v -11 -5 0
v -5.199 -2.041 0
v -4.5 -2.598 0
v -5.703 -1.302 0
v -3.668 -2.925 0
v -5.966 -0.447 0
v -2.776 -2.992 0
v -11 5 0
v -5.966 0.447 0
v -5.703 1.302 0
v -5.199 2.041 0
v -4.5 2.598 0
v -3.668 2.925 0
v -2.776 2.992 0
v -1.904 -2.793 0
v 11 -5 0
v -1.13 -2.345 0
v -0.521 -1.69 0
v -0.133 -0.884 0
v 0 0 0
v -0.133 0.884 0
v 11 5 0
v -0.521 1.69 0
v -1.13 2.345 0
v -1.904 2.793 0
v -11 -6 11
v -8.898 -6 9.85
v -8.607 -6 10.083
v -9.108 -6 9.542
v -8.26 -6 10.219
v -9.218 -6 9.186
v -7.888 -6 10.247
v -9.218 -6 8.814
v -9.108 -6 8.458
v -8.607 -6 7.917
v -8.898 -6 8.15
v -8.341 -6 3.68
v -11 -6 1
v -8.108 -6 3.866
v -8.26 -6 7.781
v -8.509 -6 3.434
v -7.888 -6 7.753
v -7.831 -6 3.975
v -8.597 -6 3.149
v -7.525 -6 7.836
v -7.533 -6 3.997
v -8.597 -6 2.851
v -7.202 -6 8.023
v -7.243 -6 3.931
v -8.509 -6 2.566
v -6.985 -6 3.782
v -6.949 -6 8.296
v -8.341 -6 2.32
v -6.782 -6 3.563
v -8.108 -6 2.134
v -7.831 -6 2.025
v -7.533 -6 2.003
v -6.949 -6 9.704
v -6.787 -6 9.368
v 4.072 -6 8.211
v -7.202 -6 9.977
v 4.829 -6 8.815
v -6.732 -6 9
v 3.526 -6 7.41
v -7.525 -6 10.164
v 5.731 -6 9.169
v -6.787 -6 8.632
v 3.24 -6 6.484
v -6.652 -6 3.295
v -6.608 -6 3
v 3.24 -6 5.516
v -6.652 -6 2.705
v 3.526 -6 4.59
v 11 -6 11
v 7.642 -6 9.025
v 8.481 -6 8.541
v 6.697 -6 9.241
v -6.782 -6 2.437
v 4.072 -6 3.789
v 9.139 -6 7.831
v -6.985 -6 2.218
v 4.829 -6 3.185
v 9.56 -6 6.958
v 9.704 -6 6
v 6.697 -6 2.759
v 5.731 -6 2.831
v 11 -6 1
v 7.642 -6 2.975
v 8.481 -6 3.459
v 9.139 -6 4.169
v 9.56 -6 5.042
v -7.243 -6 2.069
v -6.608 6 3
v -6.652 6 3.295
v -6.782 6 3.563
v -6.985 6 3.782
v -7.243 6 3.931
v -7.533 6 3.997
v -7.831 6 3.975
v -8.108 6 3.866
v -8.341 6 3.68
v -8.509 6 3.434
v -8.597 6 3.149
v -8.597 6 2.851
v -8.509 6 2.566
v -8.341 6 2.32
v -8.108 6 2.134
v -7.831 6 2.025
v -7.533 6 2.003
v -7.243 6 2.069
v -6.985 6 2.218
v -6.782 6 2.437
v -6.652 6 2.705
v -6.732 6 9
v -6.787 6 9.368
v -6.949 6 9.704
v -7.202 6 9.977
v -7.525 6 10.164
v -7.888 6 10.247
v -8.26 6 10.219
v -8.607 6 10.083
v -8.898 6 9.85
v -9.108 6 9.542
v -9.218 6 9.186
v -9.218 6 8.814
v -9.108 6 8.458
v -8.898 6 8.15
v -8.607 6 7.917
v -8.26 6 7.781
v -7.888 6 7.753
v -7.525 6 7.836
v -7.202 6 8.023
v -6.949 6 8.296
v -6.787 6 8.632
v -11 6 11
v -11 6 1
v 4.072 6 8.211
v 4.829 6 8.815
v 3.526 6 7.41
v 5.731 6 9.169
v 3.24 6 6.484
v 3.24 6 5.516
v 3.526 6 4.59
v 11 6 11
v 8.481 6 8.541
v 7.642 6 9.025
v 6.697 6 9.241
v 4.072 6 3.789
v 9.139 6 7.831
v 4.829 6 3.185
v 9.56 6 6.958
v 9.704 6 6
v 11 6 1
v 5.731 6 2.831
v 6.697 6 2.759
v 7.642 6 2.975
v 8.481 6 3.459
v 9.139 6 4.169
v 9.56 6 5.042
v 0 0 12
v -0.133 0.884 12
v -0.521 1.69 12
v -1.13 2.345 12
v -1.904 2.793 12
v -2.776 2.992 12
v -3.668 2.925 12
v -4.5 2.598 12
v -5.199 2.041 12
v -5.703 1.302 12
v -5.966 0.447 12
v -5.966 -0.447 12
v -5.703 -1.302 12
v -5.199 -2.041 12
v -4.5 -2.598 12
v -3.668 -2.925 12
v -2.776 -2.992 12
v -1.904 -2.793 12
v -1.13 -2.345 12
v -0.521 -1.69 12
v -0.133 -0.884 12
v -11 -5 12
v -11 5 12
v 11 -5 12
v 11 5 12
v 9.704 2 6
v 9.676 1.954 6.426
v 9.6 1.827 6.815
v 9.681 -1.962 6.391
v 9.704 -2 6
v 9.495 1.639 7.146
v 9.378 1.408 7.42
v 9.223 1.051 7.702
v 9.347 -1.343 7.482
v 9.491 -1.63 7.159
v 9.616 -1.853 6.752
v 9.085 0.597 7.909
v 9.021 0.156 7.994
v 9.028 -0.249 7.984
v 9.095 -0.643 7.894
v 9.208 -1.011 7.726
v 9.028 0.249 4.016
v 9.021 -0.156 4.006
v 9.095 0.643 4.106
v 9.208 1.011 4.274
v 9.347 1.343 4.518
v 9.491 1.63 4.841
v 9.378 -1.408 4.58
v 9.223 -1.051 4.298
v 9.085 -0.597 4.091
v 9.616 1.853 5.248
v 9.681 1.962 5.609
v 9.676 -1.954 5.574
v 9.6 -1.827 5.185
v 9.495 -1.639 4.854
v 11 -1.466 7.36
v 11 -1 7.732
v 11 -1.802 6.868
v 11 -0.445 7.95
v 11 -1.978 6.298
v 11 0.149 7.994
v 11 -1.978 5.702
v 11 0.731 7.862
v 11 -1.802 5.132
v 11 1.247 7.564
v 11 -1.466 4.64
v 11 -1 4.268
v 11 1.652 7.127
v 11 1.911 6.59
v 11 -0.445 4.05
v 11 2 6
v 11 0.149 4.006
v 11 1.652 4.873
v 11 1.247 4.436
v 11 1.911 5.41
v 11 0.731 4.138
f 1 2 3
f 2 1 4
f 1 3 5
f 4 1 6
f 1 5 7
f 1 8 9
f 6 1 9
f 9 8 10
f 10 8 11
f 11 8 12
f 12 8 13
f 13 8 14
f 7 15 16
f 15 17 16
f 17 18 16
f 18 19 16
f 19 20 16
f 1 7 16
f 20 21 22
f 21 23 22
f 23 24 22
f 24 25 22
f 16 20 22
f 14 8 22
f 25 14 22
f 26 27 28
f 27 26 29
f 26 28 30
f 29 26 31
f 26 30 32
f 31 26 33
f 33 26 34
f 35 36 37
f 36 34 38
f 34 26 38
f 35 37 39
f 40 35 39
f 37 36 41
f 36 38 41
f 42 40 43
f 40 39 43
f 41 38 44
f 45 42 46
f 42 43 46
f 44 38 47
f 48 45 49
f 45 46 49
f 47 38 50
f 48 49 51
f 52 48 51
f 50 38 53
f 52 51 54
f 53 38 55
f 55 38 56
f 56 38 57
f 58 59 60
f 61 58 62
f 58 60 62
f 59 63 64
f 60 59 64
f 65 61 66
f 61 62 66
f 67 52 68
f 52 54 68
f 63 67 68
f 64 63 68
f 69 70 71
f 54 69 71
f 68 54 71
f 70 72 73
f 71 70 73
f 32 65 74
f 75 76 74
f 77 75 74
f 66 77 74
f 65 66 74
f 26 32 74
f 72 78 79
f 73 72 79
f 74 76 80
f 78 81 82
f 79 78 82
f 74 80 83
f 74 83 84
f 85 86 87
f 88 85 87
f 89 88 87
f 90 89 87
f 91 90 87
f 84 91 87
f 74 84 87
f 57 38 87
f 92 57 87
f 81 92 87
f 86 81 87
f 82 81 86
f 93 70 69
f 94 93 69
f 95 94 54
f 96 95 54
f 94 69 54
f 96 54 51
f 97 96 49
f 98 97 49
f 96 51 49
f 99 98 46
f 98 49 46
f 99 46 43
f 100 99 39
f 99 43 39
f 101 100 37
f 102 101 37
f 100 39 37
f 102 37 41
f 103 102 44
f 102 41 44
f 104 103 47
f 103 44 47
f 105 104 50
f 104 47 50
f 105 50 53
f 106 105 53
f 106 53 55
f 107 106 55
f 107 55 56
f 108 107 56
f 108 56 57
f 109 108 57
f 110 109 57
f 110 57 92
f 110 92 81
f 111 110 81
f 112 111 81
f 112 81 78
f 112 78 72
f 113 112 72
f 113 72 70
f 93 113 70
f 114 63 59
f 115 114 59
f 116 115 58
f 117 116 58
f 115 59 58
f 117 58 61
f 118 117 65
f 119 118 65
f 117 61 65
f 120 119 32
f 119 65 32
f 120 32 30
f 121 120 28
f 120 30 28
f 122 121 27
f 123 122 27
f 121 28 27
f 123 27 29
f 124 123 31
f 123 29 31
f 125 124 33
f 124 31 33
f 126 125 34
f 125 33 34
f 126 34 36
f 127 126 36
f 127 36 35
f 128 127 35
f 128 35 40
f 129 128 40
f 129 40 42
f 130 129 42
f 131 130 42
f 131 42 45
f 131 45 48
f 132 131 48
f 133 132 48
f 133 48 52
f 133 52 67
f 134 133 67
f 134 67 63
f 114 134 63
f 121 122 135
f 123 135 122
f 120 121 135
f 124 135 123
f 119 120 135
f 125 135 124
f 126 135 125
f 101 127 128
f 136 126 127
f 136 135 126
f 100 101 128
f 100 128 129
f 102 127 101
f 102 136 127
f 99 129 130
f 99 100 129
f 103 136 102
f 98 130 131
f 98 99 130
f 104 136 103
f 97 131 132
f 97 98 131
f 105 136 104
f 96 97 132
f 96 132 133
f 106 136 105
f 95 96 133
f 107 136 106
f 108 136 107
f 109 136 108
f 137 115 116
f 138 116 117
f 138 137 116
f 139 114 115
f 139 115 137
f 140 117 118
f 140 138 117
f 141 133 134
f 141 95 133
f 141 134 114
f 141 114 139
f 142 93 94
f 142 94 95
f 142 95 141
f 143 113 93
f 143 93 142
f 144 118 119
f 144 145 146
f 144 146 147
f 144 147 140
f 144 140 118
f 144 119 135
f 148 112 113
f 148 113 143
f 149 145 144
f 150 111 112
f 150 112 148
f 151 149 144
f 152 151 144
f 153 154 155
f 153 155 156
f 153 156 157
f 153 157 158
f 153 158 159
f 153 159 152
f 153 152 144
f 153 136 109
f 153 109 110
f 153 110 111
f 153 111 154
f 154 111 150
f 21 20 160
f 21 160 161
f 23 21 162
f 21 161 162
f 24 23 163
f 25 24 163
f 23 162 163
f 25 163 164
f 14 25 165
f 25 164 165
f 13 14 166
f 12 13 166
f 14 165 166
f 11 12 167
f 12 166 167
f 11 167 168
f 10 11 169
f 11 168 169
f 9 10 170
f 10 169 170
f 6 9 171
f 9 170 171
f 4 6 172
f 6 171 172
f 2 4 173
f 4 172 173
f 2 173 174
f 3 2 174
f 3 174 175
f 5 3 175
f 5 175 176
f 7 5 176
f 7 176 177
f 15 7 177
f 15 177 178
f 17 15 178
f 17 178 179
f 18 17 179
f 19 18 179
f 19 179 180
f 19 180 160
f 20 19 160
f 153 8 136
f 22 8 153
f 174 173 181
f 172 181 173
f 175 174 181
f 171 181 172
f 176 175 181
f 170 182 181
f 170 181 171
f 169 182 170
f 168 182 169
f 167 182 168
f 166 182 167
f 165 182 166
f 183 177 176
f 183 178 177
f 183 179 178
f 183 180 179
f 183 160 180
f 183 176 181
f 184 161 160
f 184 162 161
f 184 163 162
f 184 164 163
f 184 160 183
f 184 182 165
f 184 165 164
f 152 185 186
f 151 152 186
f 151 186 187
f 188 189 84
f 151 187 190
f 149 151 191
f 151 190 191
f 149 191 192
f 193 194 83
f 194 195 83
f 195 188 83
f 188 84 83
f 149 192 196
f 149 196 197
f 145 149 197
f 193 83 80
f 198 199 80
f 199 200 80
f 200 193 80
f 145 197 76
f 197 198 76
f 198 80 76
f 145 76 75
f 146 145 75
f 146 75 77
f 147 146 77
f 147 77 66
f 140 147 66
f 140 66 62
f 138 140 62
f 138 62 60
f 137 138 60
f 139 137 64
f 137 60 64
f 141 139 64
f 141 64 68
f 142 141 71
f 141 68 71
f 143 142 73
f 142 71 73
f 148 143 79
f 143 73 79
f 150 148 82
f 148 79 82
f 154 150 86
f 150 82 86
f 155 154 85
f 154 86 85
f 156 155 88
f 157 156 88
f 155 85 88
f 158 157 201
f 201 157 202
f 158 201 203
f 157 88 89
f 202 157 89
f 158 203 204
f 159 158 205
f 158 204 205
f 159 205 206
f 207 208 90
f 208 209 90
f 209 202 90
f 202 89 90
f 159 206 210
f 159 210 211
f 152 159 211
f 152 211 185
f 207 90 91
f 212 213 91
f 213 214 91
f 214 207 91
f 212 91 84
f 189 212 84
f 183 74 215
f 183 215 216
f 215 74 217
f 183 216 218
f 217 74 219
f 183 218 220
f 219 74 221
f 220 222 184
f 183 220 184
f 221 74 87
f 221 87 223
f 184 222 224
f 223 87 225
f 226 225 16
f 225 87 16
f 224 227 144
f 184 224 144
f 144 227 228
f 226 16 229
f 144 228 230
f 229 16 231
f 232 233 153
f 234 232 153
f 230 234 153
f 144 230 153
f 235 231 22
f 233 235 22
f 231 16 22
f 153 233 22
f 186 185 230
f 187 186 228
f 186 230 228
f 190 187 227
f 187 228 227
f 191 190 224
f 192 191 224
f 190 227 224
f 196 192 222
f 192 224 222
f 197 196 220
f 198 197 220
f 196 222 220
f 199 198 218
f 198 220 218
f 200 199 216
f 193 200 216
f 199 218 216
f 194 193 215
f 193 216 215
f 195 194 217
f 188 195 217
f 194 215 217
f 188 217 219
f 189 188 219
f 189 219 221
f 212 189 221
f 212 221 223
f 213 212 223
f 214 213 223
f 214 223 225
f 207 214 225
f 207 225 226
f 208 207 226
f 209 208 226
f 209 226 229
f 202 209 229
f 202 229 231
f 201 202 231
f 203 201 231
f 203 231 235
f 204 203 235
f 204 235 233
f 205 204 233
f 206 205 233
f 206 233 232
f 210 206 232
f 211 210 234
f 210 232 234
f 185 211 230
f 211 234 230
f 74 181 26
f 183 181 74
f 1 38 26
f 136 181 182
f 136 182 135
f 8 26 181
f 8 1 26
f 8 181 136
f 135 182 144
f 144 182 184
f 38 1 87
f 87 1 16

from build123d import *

# Parameters (mm, degrees)
F0_W     = 22
F0_H     = 12
F1_DEPTH = 12
F2_SIZE  = 1
F3_R     = 3.25
F3_R_2   = 1.25
F3_R_3   = 1
F4_DEPTH = 12.001
F7_R     = 2
F5_DEPTH = 4
F6_R     = 3
F8_DEPTH = 25


with BuildPart() as f1:
    # F0 (on Top) → F1 (new body)
    with BuildSketch(Plane.XY):
        Rectangle(F0_W, F0_H)
    extrude(amount=F1_DEPTH)

    # F2
    f2_edges = [f1.edges().sort_by_distance(p)[0] for p in [
        (0, -6, 12),
        (0, -6, 0),
        (0, 6, 0),
        (0, 6, 12),
    ]]
    chamfer(f2_edges, length=F2_SIZE)

    # F3 (on face) → F4 (cut, through all)
    with BuildSketch(Plane.XZ.offset(6)):
        with Locations((6.454196, 6)):
            Circle(F3_R)
        with Locations((-7.981588, 9)):
            Circle(F3_R_2)
        with Locations((-7.608019, 3)):
            Circle(F3_R_3)
    extrude(amount=-F4_DEPTH, mode=Mode.SUBTRACT)

    # F7 (on face) → F5 (cut)
    with BuildSketch(Plane.YZ.offset(11)):
        with Locations((0, 6)):
            Circle(F7_R)
    extrude(amount=-F5_DEPTH, mode=Mode.SUBTRACT)

    # F6 (on face) → F8 (cut)
    with BuildSketch(Plane.XY.offset(12)):
        with Locations((-3, 0)):
            Circle(F6_R)
    extrude(amount=-F8_DEPTH, mode=Mode.SUBTRACT)


solid = f1.part
